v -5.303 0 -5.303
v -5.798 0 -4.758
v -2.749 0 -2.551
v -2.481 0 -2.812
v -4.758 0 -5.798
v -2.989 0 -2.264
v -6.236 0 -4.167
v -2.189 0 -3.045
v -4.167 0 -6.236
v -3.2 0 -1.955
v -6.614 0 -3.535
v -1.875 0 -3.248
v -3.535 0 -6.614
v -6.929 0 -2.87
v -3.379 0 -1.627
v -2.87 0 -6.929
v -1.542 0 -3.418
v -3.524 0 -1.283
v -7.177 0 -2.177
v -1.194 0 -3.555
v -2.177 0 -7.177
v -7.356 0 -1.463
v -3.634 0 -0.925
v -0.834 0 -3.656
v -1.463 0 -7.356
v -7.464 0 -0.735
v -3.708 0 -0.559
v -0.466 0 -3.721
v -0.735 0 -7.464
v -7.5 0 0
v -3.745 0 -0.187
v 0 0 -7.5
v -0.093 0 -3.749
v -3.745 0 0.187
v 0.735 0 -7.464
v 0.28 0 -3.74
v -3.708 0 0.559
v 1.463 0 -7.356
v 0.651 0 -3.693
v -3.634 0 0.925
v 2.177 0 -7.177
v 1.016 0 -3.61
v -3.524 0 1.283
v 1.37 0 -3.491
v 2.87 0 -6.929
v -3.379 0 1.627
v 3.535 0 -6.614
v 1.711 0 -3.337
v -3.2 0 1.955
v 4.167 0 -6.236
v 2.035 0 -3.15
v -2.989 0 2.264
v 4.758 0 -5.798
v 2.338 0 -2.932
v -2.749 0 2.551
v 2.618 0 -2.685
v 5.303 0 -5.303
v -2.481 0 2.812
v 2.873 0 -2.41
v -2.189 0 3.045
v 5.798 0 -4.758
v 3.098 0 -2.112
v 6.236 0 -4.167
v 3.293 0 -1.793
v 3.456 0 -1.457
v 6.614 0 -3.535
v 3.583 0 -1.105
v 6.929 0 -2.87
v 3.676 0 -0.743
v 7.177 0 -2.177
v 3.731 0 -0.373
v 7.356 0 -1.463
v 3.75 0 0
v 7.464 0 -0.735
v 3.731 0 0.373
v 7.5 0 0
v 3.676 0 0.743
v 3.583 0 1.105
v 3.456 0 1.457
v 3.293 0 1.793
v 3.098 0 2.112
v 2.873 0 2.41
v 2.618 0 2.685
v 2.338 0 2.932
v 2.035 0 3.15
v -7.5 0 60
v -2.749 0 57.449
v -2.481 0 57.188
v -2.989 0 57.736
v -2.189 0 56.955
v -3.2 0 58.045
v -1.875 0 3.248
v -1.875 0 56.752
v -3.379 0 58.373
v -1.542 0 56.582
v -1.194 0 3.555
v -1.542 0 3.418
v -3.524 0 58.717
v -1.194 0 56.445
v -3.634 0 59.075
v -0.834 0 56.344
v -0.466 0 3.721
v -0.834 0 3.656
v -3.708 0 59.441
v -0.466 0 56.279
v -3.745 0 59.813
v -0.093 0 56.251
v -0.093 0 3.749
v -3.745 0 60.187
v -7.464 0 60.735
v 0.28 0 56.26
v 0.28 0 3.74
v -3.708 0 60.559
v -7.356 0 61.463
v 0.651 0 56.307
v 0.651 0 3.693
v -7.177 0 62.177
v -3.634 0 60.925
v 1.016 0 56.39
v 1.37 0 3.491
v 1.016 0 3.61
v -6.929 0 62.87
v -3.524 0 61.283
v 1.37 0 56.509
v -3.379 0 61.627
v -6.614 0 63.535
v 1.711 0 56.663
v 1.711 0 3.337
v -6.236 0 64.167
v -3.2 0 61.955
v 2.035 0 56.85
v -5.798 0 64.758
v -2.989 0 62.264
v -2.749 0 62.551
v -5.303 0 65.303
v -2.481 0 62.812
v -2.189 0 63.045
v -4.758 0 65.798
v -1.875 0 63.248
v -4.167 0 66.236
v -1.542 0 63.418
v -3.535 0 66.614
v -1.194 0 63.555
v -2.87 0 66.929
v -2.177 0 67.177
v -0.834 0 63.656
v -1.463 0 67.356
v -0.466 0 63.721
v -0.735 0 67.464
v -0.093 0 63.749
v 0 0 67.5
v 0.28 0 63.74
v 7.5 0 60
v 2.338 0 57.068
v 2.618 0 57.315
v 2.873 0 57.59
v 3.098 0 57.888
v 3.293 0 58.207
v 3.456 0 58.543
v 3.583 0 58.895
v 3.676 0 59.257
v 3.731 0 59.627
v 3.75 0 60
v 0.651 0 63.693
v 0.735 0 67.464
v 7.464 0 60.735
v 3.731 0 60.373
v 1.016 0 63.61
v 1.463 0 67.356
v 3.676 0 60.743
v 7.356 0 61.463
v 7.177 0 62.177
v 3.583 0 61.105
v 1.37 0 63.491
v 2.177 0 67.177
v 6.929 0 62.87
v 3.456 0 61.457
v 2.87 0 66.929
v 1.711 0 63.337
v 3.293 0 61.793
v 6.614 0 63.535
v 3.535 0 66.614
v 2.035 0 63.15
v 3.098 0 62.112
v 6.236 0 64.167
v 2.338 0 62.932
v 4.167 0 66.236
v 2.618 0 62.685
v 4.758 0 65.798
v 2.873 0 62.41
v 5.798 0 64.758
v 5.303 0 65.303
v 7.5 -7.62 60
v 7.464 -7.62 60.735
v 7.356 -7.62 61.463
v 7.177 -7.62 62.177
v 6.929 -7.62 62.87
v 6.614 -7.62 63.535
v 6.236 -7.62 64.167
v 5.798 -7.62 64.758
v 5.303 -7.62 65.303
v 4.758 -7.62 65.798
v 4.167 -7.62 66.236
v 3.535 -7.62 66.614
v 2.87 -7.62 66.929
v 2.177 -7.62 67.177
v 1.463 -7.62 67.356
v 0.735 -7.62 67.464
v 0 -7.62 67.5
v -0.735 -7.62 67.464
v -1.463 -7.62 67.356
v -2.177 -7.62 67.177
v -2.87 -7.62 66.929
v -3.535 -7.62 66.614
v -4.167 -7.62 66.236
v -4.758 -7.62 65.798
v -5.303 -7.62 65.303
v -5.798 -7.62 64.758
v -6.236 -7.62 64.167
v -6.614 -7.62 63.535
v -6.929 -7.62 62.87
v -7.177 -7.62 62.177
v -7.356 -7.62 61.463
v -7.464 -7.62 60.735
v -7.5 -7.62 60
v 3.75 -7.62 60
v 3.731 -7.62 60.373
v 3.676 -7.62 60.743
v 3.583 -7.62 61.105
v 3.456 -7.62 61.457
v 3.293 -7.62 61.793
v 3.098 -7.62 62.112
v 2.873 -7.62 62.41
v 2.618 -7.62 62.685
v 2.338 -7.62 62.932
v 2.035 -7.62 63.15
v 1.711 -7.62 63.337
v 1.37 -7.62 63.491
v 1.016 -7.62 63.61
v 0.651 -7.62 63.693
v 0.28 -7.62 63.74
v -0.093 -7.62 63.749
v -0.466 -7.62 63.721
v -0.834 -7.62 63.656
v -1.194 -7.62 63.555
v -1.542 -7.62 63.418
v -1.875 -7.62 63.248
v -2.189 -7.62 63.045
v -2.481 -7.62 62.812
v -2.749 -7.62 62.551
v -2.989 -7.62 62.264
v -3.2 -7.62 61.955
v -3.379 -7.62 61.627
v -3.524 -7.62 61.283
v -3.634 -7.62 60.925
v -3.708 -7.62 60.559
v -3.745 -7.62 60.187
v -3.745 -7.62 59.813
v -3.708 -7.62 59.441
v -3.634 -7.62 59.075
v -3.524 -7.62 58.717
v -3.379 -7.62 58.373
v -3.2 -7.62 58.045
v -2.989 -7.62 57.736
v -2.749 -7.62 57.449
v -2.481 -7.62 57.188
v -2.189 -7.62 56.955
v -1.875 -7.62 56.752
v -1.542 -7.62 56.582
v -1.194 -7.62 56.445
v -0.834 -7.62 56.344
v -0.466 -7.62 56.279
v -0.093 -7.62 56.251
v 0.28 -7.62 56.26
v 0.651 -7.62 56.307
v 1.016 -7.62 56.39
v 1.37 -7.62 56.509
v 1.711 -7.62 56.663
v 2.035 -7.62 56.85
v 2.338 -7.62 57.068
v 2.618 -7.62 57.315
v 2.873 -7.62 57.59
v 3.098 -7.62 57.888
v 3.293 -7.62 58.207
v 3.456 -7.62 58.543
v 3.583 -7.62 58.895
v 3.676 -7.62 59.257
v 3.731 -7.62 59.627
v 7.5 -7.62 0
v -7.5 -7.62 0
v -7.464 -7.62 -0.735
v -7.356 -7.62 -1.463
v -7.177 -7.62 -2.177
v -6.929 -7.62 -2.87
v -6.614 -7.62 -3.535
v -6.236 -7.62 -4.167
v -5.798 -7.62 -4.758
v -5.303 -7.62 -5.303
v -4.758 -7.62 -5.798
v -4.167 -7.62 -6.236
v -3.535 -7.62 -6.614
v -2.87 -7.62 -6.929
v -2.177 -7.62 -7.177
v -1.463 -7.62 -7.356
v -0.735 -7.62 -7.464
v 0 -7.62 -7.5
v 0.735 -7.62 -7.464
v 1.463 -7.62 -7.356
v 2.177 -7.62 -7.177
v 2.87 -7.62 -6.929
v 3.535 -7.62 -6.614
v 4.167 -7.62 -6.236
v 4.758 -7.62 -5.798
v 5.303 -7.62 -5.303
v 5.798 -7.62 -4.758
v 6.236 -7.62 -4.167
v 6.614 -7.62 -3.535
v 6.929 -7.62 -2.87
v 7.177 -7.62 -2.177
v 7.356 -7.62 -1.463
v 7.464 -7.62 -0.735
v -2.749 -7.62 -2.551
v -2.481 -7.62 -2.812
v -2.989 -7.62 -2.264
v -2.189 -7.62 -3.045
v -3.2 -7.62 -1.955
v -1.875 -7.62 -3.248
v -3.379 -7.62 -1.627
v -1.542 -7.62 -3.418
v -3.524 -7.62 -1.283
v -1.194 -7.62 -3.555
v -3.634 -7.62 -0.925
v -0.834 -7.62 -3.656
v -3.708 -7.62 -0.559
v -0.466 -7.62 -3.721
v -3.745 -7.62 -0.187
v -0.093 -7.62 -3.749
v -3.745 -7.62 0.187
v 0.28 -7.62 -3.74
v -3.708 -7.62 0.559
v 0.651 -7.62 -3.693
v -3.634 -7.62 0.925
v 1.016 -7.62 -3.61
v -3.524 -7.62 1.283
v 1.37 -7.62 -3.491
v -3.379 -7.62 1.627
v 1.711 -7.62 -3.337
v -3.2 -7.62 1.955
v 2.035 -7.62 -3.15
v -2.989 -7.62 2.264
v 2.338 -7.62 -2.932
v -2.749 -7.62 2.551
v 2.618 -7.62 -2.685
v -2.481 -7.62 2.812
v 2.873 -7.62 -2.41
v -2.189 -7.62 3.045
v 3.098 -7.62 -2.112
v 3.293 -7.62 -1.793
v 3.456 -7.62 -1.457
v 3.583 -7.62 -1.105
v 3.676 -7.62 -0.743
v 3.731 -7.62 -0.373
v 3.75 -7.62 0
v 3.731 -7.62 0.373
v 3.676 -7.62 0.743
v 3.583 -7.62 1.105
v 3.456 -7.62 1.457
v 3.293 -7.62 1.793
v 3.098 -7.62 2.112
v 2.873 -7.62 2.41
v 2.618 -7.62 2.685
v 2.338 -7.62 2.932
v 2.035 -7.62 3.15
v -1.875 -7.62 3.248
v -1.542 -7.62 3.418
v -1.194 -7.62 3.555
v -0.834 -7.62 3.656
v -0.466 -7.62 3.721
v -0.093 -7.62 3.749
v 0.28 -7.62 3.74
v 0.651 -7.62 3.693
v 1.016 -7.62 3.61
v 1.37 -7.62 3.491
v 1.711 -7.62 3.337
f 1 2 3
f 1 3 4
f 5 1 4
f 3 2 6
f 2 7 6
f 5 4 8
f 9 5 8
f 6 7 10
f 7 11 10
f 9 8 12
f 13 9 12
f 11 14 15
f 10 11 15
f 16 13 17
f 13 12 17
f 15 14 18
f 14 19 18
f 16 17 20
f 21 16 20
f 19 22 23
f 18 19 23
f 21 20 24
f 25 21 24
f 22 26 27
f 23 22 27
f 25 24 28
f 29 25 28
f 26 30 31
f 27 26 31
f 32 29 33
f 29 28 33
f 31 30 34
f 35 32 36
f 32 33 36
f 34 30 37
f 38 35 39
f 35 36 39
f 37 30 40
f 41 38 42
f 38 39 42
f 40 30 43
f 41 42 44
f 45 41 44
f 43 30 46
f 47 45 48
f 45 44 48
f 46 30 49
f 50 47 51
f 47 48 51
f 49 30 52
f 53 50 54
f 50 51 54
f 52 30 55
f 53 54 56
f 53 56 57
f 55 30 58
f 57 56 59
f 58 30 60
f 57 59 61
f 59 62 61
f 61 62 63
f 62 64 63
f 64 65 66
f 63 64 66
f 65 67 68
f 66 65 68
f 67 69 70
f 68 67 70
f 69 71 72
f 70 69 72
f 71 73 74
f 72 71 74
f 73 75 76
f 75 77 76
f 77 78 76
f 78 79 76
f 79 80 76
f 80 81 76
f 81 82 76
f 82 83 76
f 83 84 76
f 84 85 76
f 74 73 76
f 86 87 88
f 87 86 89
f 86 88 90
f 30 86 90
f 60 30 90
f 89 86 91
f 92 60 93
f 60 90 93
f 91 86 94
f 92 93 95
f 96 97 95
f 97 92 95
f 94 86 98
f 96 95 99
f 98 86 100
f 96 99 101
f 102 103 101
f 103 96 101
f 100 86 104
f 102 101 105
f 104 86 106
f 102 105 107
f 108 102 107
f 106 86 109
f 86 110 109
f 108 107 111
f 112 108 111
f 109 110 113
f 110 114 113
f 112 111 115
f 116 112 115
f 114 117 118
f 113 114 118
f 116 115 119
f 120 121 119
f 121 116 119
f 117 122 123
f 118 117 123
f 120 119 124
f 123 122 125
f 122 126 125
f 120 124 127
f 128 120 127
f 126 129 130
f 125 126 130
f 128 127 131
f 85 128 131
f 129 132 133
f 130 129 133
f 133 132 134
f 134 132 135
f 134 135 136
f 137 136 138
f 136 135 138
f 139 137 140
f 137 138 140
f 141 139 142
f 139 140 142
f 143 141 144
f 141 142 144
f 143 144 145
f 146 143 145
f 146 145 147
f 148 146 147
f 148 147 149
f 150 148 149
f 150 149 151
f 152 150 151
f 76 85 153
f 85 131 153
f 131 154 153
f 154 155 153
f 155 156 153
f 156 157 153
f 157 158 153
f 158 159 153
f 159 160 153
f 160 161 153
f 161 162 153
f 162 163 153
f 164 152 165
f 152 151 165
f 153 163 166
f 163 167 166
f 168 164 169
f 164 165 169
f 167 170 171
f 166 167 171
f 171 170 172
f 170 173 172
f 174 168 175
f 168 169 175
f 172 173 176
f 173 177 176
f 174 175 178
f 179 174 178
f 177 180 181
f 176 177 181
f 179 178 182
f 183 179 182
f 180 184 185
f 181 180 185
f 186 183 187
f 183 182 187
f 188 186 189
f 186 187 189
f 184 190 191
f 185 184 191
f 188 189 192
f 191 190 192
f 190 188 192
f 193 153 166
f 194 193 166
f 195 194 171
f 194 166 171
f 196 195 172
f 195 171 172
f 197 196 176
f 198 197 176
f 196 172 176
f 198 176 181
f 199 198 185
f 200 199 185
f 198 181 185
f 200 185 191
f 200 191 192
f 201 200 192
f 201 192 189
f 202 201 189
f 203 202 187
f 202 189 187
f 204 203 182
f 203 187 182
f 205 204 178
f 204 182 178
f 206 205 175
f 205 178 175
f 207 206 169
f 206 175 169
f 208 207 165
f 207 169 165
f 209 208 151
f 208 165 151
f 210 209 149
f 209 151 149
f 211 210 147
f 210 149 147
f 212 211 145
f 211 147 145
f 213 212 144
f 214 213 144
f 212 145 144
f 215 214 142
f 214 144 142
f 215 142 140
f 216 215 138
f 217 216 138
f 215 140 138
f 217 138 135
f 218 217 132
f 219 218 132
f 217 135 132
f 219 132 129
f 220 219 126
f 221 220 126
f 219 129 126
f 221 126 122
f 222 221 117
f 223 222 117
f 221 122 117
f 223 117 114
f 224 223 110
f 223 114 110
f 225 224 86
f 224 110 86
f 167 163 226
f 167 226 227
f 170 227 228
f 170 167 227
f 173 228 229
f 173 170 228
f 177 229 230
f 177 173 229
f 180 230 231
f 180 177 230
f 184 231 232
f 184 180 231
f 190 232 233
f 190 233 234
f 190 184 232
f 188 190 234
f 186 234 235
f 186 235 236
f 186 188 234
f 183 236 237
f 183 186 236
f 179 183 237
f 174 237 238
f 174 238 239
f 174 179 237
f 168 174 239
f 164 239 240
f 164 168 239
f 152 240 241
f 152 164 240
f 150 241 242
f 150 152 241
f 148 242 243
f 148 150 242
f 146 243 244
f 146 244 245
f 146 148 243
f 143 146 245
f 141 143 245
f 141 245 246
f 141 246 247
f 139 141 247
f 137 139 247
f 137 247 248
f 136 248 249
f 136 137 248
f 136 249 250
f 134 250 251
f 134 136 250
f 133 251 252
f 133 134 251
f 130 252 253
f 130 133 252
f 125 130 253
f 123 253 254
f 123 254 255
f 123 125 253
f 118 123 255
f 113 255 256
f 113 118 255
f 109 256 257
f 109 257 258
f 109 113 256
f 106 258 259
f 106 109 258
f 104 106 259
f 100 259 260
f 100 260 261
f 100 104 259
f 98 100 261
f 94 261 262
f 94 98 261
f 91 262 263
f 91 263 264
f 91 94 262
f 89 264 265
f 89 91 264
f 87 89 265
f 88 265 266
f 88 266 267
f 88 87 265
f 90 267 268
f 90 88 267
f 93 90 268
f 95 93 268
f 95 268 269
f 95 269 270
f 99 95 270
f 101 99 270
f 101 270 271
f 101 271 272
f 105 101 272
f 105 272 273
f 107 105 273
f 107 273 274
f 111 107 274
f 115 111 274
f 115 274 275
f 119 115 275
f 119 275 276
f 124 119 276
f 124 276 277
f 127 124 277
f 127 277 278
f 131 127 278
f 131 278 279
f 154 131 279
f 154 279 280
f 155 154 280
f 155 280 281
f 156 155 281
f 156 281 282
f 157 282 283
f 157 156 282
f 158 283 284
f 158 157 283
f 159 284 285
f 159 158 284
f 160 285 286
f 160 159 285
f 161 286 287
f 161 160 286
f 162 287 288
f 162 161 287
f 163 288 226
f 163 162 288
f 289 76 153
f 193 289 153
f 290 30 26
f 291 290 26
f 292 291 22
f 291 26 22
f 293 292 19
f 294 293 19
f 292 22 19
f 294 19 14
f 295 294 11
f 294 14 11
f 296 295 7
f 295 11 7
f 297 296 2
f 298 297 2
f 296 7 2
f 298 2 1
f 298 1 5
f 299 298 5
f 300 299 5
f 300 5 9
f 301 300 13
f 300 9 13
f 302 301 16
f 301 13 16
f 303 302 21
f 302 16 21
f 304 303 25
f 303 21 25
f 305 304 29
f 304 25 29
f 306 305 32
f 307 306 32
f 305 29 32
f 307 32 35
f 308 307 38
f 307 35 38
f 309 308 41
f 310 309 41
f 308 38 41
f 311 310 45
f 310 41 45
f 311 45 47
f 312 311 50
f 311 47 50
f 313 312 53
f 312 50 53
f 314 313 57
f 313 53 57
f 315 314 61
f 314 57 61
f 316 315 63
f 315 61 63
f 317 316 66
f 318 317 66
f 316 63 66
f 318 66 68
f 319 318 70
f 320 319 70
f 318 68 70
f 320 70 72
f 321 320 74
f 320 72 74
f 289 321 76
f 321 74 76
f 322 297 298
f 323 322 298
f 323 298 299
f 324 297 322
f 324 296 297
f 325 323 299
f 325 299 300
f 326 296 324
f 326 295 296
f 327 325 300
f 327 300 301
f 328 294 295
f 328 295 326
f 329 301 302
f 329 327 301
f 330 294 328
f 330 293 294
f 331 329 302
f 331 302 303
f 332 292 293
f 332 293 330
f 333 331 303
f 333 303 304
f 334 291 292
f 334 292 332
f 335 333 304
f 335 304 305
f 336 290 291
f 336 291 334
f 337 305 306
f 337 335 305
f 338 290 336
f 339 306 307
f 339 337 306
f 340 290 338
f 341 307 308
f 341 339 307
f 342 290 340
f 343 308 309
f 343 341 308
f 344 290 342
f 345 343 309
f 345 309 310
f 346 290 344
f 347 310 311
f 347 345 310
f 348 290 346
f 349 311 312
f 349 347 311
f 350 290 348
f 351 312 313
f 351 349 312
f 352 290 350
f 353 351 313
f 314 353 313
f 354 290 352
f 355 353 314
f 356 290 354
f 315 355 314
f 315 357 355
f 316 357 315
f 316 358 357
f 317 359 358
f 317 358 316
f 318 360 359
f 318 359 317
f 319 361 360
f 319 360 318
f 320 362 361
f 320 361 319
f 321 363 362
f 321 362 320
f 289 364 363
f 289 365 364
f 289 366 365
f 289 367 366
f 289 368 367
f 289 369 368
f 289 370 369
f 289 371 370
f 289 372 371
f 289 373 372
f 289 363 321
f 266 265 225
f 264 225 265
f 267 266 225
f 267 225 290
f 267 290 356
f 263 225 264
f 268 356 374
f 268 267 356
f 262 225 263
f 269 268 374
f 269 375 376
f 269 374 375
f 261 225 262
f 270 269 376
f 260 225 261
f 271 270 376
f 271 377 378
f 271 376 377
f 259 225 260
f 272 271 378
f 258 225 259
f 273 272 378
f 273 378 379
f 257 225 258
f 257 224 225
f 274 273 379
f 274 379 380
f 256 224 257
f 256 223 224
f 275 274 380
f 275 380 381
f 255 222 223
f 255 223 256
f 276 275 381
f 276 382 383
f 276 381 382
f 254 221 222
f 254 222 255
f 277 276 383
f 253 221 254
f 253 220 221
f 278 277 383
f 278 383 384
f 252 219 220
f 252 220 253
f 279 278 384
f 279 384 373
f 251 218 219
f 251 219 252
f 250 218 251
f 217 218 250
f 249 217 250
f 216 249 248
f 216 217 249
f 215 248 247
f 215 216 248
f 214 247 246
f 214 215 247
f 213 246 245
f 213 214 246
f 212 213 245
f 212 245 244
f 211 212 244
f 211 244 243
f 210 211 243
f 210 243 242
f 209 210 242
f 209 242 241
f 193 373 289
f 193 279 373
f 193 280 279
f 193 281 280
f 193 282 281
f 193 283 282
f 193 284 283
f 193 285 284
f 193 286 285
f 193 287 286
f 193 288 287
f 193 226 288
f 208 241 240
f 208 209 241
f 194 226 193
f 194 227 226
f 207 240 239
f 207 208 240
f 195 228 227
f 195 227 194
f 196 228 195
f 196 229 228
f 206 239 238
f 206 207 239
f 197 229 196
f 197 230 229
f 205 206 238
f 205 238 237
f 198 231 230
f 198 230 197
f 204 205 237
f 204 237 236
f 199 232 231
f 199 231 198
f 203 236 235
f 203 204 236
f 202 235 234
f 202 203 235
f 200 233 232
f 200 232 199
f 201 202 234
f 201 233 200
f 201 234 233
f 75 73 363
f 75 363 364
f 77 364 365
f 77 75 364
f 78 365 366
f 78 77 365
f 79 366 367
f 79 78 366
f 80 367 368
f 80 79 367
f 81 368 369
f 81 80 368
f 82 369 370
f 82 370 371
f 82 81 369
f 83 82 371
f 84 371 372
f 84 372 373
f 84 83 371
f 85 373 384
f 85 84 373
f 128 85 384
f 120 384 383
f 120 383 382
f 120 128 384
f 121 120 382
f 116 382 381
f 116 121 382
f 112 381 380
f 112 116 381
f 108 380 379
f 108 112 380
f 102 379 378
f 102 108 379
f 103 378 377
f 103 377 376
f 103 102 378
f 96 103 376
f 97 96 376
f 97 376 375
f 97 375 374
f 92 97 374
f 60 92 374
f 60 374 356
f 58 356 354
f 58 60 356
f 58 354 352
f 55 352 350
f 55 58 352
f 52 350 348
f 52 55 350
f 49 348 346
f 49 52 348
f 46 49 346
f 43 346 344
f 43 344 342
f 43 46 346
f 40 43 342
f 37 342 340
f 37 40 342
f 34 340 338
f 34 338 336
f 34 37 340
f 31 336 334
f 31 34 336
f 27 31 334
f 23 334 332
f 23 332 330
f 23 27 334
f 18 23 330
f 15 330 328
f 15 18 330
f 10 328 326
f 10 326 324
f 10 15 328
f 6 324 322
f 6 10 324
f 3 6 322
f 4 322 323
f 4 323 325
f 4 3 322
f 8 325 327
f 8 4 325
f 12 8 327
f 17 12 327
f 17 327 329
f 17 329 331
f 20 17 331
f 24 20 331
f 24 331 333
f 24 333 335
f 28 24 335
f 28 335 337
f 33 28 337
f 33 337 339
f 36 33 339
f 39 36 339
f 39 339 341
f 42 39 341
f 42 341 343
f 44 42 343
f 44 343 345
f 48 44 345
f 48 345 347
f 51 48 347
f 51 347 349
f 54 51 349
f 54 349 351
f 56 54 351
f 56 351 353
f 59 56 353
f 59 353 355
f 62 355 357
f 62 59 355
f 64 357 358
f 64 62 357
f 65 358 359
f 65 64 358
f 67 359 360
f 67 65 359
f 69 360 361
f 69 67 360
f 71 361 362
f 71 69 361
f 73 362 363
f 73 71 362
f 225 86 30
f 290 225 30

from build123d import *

# Parameters (mm, degrees)
F0_R     = 3.75
F1_DEPTH = 7.62


with BuildPart() as f1:
    # F0 (on Front) → F1 (new body)
    with BuildSketch(Plane.XZ):
        with BuildLine():
            Line((7.5, 0), (7.5, 60))
            ThreePointArc((7.5, 60), (0, 52.5), (-7.5, 60))
            Line((-7.5, 60), (-7.5, 0))
            ThreePointArc((-7.5, 0), (0, 7.5), (7.5, 0))
        make_face()
        with BuildLine():
            ThreePointArc((-7.5, 60), (0, 52.5), (7.5, 60))
            ThreePointArc((7.5, 60), (0, 67.5), (-7.5, 60))
        make_face()
        with Locations((0, 60)):
            Circle(F0_R, mode=Mode.SUBTRACT)
        with BuildLine():
            ThreePointArc((-7.5, 0), (0, -7.5), (7.5, 0))
            ThreePointArc((7.5, 0), (0, 7.5), (-7.5, 0))
        make_face()
        Circle(F0_R, mode=Mode.SUBTRACT)
    extrude(amount=F1_DEPTH)


solid = f1.part
